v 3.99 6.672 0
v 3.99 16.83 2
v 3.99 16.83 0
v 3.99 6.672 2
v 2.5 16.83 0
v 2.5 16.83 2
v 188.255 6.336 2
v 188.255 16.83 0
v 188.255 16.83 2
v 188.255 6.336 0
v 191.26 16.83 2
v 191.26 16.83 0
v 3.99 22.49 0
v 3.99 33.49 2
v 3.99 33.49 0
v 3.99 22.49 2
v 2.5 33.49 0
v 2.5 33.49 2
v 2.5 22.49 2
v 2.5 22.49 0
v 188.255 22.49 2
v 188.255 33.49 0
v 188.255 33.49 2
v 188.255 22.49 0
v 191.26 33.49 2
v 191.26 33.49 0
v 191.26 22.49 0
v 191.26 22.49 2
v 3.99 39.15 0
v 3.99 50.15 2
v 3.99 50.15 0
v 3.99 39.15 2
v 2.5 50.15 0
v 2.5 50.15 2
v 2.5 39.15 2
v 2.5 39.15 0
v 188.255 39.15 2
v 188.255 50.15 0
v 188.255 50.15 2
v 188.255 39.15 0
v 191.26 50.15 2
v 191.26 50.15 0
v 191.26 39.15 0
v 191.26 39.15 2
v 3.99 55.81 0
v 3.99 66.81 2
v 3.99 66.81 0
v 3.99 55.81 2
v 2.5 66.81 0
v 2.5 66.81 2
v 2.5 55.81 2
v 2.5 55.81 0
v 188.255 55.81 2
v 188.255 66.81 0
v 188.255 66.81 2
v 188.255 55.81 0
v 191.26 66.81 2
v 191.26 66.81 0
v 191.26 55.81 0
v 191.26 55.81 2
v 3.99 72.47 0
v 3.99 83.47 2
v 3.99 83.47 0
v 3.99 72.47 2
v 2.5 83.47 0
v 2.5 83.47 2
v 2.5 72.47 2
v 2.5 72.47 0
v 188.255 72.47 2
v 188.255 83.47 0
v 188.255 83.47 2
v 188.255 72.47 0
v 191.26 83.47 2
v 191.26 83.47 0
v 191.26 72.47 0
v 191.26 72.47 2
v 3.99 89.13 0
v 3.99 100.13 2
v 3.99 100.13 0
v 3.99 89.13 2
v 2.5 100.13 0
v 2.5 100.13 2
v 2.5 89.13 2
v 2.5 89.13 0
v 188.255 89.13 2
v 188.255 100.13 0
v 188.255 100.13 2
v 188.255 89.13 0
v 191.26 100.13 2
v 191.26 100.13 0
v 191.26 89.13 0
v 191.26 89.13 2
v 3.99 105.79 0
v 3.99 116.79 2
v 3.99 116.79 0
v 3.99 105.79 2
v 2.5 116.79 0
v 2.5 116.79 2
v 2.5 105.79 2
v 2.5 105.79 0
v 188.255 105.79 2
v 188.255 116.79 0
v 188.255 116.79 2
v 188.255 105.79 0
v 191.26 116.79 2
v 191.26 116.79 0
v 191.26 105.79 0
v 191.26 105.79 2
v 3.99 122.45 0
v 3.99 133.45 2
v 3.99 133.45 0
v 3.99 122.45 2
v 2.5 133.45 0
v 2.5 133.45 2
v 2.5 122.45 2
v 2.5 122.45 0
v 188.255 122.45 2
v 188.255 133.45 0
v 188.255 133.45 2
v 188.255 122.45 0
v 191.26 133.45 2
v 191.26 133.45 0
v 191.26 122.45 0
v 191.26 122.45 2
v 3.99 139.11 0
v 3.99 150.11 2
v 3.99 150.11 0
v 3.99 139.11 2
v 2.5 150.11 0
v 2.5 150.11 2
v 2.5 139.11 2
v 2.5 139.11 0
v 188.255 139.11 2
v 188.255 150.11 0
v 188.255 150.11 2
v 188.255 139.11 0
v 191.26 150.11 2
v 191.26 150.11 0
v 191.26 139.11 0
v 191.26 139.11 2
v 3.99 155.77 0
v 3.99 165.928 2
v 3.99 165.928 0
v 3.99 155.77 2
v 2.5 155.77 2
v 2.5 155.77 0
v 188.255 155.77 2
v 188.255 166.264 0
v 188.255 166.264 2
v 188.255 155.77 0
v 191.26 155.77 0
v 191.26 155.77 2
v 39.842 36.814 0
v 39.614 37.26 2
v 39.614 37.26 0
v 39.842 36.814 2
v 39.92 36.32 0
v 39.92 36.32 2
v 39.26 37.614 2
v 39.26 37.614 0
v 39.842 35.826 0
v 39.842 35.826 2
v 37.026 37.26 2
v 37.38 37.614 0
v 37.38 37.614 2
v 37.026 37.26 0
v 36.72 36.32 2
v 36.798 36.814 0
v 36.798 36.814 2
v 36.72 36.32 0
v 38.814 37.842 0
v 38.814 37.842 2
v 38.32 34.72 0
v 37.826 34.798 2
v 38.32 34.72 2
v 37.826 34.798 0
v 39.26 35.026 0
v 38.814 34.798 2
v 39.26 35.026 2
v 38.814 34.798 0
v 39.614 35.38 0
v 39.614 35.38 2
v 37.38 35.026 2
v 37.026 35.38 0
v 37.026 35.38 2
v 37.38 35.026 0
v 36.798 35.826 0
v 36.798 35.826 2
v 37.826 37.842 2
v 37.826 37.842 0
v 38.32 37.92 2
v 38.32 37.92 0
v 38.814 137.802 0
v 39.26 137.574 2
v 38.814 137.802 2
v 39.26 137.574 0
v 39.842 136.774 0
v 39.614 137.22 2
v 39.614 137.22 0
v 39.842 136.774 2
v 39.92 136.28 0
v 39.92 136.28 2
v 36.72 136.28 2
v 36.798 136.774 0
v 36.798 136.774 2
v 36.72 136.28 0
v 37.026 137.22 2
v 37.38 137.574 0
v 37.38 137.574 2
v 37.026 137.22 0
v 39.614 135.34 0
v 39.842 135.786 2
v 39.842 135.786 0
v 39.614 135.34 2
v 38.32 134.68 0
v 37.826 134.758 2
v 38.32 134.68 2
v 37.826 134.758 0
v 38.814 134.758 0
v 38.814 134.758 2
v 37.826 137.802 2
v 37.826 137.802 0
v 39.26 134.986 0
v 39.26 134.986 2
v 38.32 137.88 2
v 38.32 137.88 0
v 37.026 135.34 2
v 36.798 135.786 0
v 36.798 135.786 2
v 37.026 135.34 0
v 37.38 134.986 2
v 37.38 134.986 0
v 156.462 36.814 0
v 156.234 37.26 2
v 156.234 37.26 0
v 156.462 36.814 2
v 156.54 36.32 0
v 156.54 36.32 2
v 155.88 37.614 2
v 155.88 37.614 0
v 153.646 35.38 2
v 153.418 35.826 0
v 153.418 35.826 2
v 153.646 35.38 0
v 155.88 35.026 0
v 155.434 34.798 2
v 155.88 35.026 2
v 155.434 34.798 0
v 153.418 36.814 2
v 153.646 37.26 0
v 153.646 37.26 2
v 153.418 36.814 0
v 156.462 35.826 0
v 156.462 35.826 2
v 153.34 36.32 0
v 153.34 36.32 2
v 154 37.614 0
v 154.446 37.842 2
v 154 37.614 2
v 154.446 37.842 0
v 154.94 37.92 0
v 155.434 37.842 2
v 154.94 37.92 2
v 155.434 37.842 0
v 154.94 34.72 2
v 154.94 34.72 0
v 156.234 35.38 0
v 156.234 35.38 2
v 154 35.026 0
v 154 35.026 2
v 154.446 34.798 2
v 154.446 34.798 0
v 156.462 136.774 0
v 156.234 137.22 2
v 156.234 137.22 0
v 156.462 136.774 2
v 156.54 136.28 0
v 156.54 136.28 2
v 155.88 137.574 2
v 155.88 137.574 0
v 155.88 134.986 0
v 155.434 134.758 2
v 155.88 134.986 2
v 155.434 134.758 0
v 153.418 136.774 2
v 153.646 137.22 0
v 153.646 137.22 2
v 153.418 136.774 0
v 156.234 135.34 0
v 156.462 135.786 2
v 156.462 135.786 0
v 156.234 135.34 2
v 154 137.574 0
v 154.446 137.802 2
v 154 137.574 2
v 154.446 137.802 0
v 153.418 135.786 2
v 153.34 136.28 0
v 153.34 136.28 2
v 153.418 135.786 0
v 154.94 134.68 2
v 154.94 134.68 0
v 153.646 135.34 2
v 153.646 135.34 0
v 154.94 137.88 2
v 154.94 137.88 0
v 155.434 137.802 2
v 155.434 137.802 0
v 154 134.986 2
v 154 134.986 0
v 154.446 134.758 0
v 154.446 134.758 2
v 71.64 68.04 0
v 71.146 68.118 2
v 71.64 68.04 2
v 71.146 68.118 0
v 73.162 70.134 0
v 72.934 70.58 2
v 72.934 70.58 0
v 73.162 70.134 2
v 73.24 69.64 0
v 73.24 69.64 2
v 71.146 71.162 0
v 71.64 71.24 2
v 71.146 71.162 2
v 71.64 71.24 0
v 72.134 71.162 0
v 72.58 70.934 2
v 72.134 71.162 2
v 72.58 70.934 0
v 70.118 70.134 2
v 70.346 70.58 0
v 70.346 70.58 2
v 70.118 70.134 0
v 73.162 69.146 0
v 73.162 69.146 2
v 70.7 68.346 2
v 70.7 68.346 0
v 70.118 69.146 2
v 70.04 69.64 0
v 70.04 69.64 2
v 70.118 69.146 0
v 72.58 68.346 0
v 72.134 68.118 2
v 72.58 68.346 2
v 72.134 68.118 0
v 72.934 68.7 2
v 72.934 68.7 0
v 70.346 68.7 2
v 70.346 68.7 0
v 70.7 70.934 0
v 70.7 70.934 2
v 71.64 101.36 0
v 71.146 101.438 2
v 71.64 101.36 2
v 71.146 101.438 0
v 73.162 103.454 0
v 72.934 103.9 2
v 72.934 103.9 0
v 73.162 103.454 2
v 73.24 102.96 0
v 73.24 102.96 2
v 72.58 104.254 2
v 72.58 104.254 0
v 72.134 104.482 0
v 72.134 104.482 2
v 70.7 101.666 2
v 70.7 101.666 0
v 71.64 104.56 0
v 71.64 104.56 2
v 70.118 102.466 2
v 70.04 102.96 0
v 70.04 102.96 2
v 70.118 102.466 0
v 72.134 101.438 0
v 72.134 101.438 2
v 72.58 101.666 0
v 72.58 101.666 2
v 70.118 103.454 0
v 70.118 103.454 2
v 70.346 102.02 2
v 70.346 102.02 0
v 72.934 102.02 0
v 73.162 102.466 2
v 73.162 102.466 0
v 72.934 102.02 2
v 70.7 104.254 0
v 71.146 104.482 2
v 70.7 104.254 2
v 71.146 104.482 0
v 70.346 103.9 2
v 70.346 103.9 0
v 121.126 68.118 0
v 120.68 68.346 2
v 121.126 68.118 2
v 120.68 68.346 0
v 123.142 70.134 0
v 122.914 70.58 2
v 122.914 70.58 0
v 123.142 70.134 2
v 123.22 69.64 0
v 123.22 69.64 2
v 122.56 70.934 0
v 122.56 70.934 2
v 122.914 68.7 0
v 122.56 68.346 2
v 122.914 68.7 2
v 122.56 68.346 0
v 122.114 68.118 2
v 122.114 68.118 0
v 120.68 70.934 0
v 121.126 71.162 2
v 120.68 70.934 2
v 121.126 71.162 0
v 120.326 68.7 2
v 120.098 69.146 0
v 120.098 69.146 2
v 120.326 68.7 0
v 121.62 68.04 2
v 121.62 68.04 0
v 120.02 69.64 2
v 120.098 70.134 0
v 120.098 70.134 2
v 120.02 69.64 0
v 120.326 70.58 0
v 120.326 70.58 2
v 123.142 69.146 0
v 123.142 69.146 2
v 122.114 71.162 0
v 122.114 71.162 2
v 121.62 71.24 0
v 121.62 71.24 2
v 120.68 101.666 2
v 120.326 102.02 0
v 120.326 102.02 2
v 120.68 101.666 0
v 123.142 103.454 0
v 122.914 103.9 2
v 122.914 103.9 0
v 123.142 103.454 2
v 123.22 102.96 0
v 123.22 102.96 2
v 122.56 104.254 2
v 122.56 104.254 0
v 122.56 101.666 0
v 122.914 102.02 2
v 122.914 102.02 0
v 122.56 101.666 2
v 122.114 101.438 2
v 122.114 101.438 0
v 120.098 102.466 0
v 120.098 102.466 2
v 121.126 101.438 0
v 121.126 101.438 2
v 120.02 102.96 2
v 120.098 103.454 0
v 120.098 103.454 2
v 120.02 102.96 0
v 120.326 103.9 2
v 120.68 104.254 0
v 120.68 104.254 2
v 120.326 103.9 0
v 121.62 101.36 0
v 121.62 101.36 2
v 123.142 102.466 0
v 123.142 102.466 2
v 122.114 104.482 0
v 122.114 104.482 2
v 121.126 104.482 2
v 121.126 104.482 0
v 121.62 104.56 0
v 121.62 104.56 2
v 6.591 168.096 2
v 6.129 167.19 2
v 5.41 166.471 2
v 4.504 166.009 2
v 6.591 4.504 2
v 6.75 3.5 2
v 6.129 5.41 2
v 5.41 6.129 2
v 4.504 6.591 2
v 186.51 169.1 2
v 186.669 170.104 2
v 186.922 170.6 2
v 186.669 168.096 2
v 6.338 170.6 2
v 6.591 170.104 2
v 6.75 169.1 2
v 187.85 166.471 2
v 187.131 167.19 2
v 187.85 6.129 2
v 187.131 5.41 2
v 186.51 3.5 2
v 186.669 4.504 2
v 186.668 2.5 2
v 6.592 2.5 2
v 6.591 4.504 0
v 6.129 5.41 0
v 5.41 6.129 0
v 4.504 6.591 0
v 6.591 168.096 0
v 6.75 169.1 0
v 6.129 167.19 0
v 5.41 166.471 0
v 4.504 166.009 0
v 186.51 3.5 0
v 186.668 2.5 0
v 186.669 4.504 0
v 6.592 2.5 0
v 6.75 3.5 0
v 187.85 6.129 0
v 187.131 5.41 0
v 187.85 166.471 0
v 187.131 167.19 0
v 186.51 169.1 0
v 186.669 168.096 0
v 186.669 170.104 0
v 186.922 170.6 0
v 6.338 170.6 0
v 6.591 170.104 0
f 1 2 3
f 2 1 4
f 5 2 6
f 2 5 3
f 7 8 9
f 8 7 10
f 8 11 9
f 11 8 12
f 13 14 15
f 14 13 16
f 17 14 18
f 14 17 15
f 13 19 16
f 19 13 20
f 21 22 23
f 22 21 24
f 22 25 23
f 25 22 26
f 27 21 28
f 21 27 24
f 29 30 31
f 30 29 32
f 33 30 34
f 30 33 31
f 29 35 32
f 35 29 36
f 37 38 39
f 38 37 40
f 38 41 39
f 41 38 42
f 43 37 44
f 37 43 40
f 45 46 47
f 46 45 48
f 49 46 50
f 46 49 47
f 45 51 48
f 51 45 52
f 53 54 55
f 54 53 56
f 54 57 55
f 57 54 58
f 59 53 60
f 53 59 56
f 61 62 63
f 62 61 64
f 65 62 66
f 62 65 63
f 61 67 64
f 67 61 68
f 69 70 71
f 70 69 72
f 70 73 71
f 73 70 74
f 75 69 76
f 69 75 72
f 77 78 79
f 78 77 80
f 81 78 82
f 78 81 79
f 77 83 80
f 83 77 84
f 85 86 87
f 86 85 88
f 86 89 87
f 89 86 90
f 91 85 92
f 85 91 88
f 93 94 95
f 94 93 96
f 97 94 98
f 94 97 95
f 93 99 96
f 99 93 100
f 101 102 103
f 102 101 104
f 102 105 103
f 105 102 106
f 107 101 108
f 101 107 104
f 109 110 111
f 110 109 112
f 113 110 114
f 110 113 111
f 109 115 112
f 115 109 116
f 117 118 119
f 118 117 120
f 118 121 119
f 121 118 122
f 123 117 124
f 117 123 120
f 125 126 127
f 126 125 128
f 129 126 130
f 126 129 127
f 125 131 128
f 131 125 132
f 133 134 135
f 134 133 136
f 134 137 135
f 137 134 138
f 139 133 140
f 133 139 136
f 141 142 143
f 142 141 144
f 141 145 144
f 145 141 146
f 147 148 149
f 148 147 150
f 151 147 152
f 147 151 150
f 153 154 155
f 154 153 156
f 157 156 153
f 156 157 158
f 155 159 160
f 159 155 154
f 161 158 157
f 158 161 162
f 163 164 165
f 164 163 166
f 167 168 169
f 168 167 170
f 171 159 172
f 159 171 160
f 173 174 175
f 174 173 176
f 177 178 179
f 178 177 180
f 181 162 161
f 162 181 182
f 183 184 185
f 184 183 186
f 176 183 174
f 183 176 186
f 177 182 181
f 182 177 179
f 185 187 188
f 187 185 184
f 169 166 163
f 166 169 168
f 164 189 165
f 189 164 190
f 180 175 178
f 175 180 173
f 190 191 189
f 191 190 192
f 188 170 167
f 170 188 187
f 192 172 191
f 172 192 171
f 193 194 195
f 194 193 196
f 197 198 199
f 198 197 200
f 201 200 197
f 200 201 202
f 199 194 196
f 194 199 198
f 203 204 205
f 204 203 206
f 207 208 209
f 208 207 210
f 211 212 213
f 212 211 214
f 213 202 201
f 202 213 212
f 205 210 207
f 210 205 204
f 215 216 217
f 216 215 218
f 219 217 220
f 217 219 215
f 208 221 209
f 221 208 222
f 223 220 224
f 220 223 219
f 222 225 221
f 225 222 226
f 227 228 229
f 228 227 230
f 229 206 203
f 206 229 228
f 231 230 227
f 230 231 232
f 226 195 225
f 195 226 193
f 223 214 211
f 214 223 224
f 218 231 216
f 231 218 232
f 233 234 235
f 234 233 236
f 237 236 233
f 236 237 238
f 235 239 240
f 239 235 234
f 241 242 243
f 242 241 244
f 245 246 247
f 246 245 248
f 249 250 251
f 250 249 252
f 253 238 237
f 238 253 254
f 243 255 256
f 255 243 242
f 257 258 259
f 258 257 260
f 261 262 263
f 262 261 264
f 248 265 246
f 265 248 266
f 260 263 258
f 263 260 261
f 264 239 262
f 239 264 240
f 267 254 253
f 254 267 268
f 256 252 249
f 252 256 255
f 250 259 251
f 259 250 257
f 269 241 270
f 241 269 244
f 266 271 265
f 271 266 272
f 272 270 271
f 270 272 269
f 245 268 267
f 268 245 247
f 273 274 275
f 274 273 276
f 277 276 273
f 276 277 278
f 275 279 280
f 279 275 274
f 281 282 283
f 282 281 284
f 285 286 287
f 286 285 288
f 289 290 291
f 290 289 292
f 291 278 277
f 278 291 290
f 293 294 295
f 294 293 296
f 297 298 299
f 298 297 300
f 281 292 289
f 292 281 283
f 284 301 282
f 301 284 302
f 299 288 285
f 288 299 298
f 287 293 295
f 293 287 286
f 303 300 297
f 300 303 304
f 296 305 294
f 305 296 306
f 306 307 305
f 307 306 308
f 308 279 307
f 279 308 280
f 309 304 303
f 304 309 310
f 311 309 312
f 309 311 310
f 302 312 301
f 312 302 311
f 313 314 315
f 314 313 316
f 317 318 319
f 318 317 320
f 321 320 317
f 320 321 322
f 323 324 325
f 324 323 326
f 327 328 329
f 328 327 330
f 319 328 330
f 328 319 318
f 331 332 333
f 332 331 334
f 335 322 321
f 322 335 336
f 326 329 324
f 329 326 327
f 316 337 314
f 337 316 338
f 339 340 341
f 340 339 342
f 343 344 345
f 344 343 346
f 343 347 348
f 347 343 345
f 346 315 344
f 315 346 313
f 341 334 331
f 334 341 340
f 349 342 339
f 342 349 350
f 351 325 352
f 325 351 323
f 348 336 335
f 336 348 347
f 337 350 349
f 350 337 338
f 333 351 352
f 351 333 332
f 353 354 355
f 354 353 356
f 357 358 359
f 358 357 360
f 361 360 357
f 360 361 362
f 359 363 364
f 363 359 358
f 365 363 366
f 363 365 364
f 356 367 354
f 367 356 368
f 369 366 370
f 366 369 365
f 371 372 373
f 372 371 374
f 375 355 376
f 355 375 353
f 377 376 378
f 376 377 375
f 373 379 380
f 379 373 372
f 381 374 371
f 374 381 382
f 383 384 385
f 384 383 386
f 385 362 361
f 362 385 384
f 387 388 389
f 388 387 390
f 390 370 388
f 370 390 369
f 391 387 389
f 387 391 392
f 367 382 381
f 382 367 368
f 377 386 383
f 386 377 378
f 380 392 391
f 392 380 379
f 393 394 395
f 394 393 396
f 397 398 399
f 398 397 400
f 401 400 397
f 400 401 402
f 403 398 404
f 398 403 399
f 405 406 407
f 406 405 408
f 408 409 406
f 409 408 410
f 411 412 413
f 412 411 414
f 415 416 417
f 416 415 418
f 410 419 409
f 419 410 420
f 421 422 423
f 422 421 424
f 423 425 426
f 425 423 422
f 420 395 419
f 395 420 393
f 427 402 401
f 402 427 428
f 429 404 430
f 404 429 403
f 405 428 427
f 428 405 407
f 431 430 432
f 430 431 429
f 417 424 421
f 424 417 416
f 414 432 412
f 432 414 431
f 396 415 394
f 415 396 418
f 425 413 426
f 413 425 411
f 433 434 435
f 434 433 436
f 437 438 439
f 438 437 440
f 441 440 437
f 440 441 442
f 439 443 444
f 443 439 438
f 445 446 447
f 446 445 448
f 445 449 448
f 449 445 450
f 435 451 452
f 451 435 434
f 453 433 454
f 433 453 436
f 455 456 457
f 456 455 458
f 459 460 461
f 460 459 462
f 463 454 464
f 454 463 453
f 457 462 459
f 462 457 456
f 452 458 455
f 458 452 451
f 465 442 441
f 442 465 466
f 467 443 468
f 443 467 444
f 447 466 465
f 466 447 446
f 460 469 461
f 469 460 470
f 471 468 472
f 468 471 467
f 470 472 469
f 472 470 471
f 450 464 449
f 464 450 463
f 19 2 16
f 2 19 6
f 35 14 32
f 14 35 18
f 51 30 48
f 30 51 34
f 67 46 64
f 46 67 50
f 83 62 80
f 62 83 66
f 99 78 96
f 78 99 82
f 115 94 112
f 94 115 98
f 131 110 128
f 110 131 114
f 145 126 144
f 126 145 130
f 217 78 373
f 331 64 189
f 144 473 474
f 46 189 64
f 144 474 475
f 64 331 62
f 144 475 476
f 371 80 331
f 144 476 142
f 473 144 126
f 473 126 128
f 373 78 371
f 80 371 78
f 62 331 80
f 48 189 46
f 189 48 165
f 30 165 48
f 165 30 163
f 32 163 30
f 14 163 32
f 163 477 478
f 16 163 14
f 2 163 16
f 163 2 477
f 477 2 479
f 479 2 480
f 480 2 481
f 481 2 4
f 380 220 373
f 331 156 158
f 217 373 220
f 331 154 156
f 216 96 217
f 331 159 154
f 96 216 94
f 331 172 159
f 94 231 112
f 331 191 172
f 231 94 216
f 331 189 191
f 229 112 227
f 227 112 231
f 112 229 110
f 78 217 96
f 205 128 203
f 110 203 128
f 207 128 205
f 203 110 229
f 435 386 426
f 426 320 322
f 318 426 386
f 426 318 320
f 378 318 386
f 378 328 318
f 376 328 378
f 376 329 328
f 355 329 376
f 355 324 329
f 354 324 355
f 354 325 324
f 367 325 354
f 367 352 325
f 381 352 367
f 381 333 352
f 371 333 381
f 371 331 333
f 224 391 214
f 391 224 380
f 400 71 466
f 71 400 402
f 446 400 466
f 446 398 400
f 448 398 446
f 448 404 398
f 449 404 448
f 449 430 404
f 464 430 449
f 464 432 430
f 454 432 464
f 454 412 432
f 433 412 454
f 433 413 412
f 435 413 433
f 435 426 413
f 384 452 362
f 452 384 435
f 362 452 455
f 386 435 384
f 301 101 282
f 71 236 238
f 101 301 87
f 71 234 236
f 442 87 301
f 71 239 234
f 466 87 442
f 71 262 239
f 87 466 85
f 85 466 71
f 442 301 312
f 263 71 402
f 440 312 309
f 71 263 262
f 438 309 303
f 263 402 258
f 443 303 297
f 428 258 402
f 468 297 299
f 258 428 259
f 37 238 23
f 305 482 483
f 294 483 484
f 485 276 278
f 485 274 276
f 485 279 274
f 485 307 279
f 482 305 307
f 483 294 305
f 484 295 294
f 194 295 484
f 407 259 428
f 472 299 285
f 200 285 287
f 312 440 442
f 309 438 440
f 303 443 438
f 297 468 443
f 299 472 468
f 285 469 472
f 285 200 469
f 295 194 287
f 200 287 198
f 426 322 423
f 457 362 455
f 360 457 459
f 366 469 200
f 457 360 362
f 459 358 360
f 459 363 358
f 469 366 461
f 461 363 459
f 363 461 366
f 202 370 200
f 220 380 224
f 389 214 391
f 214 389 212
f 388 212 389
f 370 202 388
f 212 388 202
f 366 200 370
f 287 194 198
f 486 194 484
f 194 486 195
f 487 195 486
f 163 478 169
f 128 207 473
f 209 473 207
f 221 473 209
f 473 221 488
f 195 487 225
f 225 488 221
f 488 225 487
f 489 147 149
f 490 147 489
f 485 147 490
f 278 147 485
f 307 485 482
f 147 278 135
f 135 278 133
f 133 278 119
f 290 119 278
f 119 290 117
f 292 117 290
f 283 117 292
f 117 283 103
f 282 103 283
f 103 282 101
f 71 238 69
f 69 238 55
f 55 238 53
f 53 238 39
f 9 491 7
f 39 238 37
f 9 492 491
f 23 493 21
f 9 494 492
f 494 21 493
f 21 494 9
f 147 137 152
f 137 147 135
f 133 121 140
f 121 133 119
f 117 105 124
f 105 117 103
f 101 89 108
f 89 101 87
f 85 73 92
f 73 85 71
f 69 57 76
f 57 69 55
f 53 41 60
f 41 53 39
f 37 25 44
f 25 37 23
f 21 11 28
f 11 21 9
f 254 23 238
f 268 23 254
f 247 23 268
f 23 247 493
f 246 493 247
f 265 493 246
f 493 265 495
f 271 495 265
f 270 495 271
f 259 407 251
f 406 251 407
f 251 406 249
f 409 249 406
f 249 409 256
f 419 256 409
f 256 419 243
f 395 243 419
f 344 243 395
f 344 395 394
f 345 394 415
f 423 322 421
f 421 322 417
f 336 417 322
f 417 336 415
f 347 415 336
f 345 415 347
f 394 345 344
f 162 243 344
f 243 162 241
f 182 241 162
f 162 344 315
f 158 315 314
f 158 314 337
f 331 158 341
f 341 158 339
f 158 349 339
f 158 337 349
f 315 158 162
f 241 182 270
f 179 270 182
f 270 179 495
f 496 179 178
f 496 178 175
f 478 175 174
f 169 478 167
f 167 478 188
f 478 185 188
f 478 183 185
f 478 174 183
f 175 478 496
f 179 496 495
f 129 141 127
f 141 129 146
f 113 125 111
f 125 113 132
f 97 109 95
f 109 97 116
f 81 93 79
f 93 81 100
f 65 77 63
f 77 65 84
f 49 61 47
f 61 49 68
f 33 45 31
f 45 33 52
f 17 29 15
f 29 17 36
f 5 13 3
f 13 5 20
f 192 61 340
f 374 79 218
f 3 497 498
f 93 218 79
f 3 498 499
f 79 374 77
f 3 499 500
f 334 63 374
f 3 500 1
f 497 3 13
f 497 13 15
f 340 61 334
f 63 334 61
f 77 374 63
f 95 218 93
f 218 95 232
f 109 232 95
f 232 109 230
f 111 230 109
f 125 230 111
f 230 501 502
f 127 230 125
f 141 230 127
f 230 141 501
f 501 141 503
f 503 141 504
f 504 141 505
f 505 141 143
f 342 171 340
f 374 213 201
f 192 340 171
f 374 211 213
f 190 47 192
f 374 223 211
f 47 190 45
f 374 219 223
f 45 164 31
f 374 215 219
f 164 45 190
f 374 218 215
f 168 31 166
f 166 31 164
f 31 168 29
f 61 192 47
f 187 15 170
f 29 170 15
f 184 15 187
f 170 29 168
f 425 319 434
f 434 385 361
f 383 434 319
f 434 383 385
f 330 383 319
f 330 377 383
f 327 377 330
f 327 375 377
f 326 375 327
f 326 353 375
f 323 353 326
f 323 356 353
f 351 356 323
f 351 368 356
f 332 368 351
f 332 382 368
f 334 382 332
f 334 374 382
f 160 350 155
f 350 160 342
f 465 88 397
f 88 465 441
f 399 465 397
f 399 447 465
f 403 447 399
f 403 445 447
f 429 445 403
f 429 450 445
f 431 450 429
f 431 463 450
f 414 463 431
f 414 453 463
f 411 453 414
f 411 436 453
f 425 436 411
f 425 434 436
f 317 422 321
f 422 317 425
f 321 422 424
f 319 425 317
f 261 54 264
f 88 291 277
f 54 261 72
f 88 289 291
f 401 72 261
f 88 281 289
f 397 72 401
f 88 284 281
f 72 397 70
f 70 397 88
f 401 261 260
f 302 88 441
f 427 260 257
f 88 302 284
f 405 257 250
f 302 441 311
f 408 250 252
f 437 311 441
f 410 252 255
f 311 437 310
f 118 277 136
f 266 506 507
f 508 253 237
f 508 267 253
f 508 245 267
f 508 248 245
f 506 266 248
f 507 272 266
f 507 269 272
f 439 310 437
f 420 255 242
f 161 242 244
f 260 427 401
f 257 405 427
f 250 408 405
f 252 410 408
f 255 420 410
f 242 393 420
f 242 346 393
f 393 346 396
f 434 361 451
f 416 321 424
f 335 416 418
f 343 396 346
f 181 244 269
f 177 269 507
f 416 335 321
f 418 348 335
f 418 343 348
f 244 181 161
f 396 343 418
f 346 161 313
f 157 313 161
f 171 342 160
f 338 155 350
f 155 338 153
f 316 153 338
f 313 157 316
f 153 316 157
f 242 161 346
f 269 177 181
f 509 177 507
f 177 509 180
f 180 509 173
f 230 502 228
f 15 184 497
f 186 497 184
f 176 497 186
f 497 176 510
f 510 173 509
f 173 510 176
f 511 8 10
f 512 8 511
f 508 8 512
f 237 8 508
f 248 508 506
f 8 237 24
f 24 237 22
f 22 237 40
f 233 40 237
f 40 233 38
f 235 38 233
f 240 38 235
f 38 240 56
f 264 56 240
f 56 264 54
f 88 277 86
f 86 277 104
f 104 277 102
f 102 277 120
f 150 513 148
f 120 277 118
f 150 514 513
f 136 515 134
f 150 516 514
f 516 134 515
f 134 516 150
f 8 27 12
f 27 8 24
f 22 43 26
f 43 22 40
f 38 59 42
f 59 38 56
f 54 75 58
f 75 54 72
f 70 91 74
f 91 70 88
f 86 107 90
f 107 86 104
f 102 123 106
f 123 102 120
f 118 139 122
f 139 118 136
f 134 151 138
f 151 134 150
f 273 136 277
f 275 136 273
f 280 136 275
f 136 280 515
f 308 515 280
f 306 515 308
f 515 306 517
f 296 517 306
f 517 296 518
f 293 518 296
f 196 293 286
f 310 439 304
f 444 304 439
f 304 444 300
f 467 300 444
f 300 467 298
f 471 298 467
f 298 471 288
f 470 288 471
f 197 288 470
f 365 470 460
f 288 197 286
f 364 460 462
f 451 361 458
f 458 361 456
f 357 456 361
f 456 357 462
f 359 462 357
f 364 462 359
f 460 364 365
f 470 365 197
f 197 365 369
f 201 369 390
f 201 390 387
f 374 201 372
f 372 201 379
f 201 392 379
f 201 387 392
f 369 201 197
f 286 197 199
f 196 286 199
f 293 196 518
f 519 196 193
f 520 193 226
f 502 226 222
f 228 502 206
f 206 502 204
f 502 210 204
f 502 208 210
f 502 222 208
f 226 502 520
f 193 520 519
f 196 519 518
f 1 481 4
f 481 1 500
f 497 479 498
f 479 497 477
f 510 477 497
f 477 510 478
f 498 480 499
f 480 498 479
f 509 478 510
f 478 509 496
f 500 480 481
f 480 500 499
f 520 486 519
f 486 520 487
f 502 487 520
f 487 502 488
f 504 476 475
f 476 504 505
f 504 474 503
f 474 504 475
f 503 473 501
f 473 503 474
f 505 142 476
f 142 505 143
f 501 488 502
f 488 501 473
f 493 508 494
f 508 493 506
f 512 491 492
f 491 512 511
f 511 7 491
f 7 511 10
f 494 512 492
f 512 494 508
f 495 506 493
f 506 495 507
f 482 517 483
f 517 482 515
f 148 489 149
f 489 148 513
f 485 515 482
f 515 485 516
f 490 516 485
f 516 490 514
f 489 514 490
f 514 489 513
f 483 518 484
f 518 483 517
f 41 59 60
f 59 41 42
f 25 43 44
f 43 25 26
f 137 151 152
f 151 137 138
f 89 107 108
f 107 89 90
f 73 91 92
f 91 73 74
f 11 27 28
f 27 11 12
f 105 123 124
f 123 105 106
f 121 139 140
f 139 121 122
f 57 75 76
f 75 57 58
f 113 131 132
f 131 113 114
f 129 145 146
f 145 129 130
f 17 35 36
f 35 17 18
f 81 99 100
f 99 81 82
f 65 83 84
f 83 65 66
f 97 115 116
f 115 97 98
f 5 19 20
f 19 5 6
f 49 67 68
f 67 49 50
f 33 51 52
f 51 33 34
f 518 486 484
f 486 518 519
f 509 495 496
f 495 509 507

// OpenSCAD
// file: letter_plate.scad
// This work is licensed under a Creative Commons Attribution-NonCommercial-ShareAlike 4.0 International License.
// https://creativecommons.org/licenses/by-nc-sa/4.0/
// (c) 2018 Florian Roks <florian.roks (a) gmail.com>

include <config.scad>

module letter(v, special) {
    if (special) {
        text(text = v, size = FONT_SPECIAL_SIZE, valign="center", halign="center", font=FONT_SPECIAL);
    } else {
        text(text = v, size = FONT_NORMAL_SIZE, valign="center", halign="center", font=FONT_NORMAL);
    }
}

module letter_cutouts() {
    translate([HORIZ_SIDE_EXTRA + LED_STRIPE_HORIZ_DISTANCE/2,
               VERT_SIDE_EXTRA + LED_STRIPE_VERT_DISTANCE/2,
               LETTER_PLATE_LETTER_BOTTOM]) {
        for(y = [0 : 1 : LETTER_MATRIX_HEIGHT - 1]) {
            for(x = [LETTER_MATRIX_WIDTH - 1 : -1 : 0]) {
                translate([
                    (LETTER_MATRIX_WIDTH*LED_STRIPE_HORIZ_DISTANCE) - (x+1)*LED_STRIPE_HORIZ_DISTANCE, 
                    (LETTER_MATRIX_HEIGHT * LED_STRIPE_VERT_DISTANCE) - (y+1)*LED_STRIPE_VERT_DISTANCE, 
                    0]) {
                    linear_extrude(height=LETTER_PLATE_THICKNESS)
                            rotate([0,180,0])
                                letter(v = LETTERFACE[y][x],
                                       special = (LETTER_MATRIX_HEIGHT-1 == y),
                                       x=x, y=y);
                }
            }
        }
    }
}

module front_plate() {
    cube([TOTAL_WIDTH, TOTAL_HEIGHT, LETTER_PLATE_THICKNESS]);
}

module outer_frame() {
    cube([TOTAL_WIDTH, OUTER_WALL_THICKNESS, OUTER_WALL_HEIGHT]);
    cube([OUTER_WALL_THICKNESS, TOTAL_HEIGHT, OUTER_WALL_HEIGHT]);
    translate([0, TOTAL_HEIGHT-OUTER_WALL_THICKNESS, 0]) 
        cube([TOTAL_WIDTH, OUTER_WALL_THICKNESS, OUTER_WALL_HEIGHT]);
    translate([TOTAL_WIDTH-OUTER_WALL_THICKNESS, 0, 0]) 
        cube([OUTER_WALL_THICKNESS, TOTAL_HEIGHT, OUTER_WALL_HEIGHT]);
}

module inner_separator_grid() {
    for(x = [0 : 1 : LETTER_MATRIX_WIDTH]) {
        translate([x*LED_STRIPE_HORIZ_DISTANCE+HORIZ_SIDE_EXTRA-LETTER_SEPARATOR_THICKNESS/2, 
                   0, 
                   0])
            cube([LETTER_SEPARATOR_THICKNESS, 
                  TOTAL_HEIGHT, 
                  LETTER_SEPARATOR_HEIGHT]);
    }
    for(y = [0 : 1 : LETTER_MATRIX_HEIGHT]) {
        translate([0, 
                   (y*LED_STRIPE_VERT_DISTANCE)+VERT_SIDE_EXTRA-LETTER_SEPARATOR_THICKNESS/2, 
                   0])
            cube([TOTAL_WIDTH, 
                  LETTER_SEPARATOR_THICKNESS, 
                  LETTER_SEPARATOR_HEIGHT]);
    }   
}

module screw_hole_walls() {
    for (p = LETTER_PLATE_MOUNTING_HOLE_POSITIONS) {
        translate([HORIZ_SIDE_EXTRA + LED_STRIPE_HORIZ_DISTANCE * p[0], 
                   VERT_SIDE_EXTRA + LED_STRIPE_VERT_DISTANCE * p[1], 
                   LETTER_SEPARATOR_HEIGHT - LETTER_SEPARATOR_HEIGHT]) 
            cylinder(h=LETTER_SEPARATOR_HEIGHT, d=LETTER_PLATE_SCREW_WALL_DIAMETER);
    }
}

module screw_holes() {
    for (p = LETTER_PLATE_MOUNTING_HOLE_POSITIONS) {
        translate([HORIZ_SIDE_EXTRA + LED_STRIPE_HORIZ_DISTANCE * p[0],
                   VERT_SIDE_EXTRA + LED_STRIPE_VERT_DISTANCE * p[1],
                   LETTER_SEPARATOR_HEIGHT - LETTER_PLATE_SCREW_INSERT_HEIGHT]) 
            cylinder(h=LETTER_PLATE_SCREW_INSERT_HEIGHT+0.01, 
                     d=LETTER_PLATE_SCREW_INSERT_DIAMETER);
    }
    
}

module corner_hole_wall(offset=0,h=OUTER_WALL_HEIGHT) {
    translate([CORNER_MOUNTING_HOLE_WALL_DIAMETER/2,
               CORNER_MOUNTING_HOLE_WALL_DIAMETER/2,
               h/2])
        cylinder(h=h, 
                 d=CORNER_MOUNTING_HOLE_WALL_DIAMETER+offset, 
                 center=true);
}

module corner_holes_walls(offset=0,h=OUTER_WALL_HEIGHT) {
    translate([CORNER_MOUNTING_HOLE_OFFSET,
               CORNER_MOUNTING_HOLE_OFFSET,
               0]) 
        corner_hole_wall(offset=offset,h=h);
    translate([CORNER_MOUNTING_HOLE_OFFSET,
               TOTAL_HEIGHT - CORNER_MOUNTING_HOLE_WALL_DIAMETER - CORNER_MOUNTING_HOLE_OFFSET,
               0]) 
        corner_hole_wall(offset=offset,h=h);
    translate([TOTAL_WIDTH - CORNER_MOUNTING_HOLE_WALL_DIAMETER-CORNER_MOUNTING_HOLE_OFFSET,
               CORNER_MOUNTING_HOLE_OFFSET,
               0]) 
        corner_hole_wall(offset=offset,h=h);
    translate([TOTAL_WIDTH - CORNER_MOUNTING_HOLE_WALL_DIAMETER - CORNER_MOUNTING_HOLE_OFFSET,
               TOTAL_HEIGHT - CORNER_MOUNTING_HOLE_WALL_DIAMETER - CORNER_MOUNTING_HOLE_OFFSET,
               0]) 
        corner_hole_wall(offset=offset,h=h);
}

module corner_holes_walls_bump() {
    intersection() {
        corner_holes_walls(offset=OUTER_WALL_THICKNESS, h=LETTER_SEPARATOR_HEIGHT);
        cube([TOTAL_WIDTH, TOTAL_HEIGHT, TOTAL_DEPTH]);
    }
}


module corner_hole() {
    translate([CORNER_MOUNTING_HOLE_WALL_DIAMETER/2,
               CORNER_MOUNTING_HOLE_WALL_DIAMETER/2,
               CORNER_MOUNTING_HOLE_INSERT_HEIGHT/2 + OUTER_WALL_HEIGHT - CORNER_MOUNTING_HOLE_INSERT_HEIGHT])
        cylinder(h=CORNER_MOUNTING_HOLE_INSERT_HEIGHT+0.01, 
                 d=CORNER_MOUNTING_HOLE_INSERT_DIAMETER, 
                 center=true);
}

module corner_holes() {
    translate([CORNER_MOUNTING_HOLE_OFFSET,
               CORNER_MOUNTING_HOLE_OFFSET,
               0]) 
        corner_hole();
    translate([CORNER_MOUNTING_HOLE_OFFSET,
               TOTAL_HEIGHT-CORNER_MOUNTING_HOLE_WALL_DIAMETER-CORNER_MOUNTING_HOLE_OFFSET,
               0]) 
        corner_hole();
    translate([TOTAL_WIDTH-CORNER_MOUNTING_HOLE_WALL_DIAMETER-CORNER_MOUNTING_HOLE_OFFSET,
               CORNER_MOUNTING_HOLE_OFFSET,
               0]) 
        corner_hole();
    translate([TOTAL_WIDTH-CORNER_MOUNTING_HOLE_WALL_DIAMETER - CORNER_MOUNTING_HOLE_OFFSET,
               TOTAL_HEIGHT-CORNER_MOUNTING_HOLE_WALL_DIAMETER - CORNER_MOUNTING_HOLE_OFFSET,
               0]) 
        corner_hole();
}

module clock_front() {
    difference() {
        union() {
            outer_frame();
            front_plate();
            inner_separator_grid();
            screw_hole_walls();
            corner_holes_walls_bump();
            corner_holes_walls();
        }
        letter_cutouts();
        screw_holes();
        corner_holes();
    }
    
}

// arranged for 3d-printing / stl-export
clock_front();
// file: led_holder_plate.scad
// This work is licensed under a Creative Commons Attribution-NonCommercial-ShareAlike 4.0 International License.
// https://creativecommons.org/licenses/by-nc-sa/4.0/
// (c) 2018 Florian Roks <florian.roks (a) gmail.com>

include <config.scad>
use <letter_plate.scad>

module led_holes() {
	for (y = [0 : 1 : LETTER_MATRIX_HEIGHT - 1]) {
		for (x = [0 : 1 : LETTER_MATRIX_WIDTH - 1]) {
            translate([HORIZ_SIDE_EXTRA + LED_STRIPE_HORIZ_DISTANCE*x,
                       VERT_SIDE_EXTRA + LED_STRIPE_VERT_DISTANCE*y, 
                       0]) 
			translate([LED_STRIPE_HORIZ_DISTANCE/2, 
                       LED_STRIPE_VERT_DISTANCE/2, 
                       -10]) 
                cube([LED_STRIPE_LED_WIDTH, 
                      LED_STRIPE_LED_HEIGHT, 
                      100], 
                     center = true);
		}
	}
}

module cap_holes() {
	for (y = [0 : 1 : LETTER_MATRIX_HEIGHT - 1]) {
		for (x = [0 : 1 : LETTER_MATRIX_WIDTH - 1]) {
            translate([HORIZ_SIDE_EXTRA + LED_STRIPE_HORIZ_DISTANCE*x+LED_STRIPE_CAP_OFFSET_X,
                       VERT_SIDE_EXTRA + LED_STRIPE_VERT_DISTANCE*y+LED_STRIPE_CAP_OFFSET_Y, 
                       0]) 
			translate([LED_STRIPE_HORIZ_DISTANCE/2, 
                       LED_STRIPE_VERT_DISTANCE/2, 
                       LED_HOLDER_PLATE_HEIGHT]) 
                cube([LED_STRIPE_CAP_WIDTH, 
                      LED_STRIPE_CAP_HEIGHT, 
                      LED_STRIPE_CAP_DEPTH+0.01], 
                     center = true);
		}
	}
}

module screw_holes() {
   for (p = LETTER_PLATE_MOUNTING_HOLE_POSITIONS) {
       translate([HORIZ_SIDE_EXTRA + LED_STRIPE_HORIZ_DISTANCE*p[0], 
                  VERT_SIDE_EXTRA + LED_STRIPE_VERT_DISTANCE*p[1],
                  0]) 
        cylinder(d=SCREW_DIAMETER, h=100, center=true);
   }
}

module separator_cutout() {
    for (y = [0 : 1 : LETTER_MATRIX_HEIGHT]) {
        translate([TOTAL_WIDTH/2, 
                   VERT_SIDE_EXTRA + LED_STRIPE_VERT_DISTANCE*y, 
                   LED_HOLDER_PLATE_DIVIDER_CUTOUT_DEPTH/2]) 
            cube([TOTAL_WIDTH, 
                  LETTER_SEPARATOR_THICKNESS + LED_HOLDER_PLATE_DIVIDER_CUTOUT_TOLERANCE,
                  LED_HOLDER_PLATE_DIVIDER_CUTOUT_DEPTH+0.01], 
                 center = true);
    }
    for (x = [0 : 1 : LETTER_MATRIX_WIDTH]) {
        translate([HORIZ_SIDE_EXTRA + LED_STRIPE_HORIZ_DISTANCE*x, 
                   VERT_SIDE_EXTRA + TOTAL_HEIGHT/2, 
                   LED_HOLDER_PLATE_DIVIDER_CUTOUT_DEPTH/2]) 
            cube([LETTER_SEPARATOR_THICKNESS + LED_HOLDER_PLATE_DIVIDER_CUTOUT_TOLERANCE, 
                  TOTAL_WIDTH, 
                  LED_HOLDER_PLATE_DIVIDER_CUTOUT_DEPTH+0.01], 
                 center = true);
    }
    for (p = LETTER_PLATE_MOUNTING_HOLE_POSITIONS) {
       translate([HORIZ_SIDE_EXTRA + LED_STRIPE_HORIZ_DISTANCE*p[0], 
                  VERT_SIDE_EXTRA + LED_STRIPE_VERT_DISTANCE*p[1], 
                  LED_HOLDER_PLATE_DIVIDER_CUTOUT_DEPTH/2])
        cylinder(d=LETTER_PLATE_SCREW_INSERT_DIAMETER+LETTER_PLATE_SCREW_INSERT_WALL_THICKNESS+LED_HOLDER_PLATE_DIVIDER_CUTOUT_TOLERANCE, 
                 h=LED_HOLDER_PLATE_DIVIDER_CUTOUT_DEPTH+0.01, center=true);
    }
}

module fit_inner_cube() {
    size_x = TOTAL_WIDTH-2*OUTER_WALL_THICKNESS-INNER_PLATE_TOLERANCE/2;
    size_y = TOTAL_HEIGHT-2*OUTER_WALL_THICKNESS-INNER_PLATE_TOLERANCE/2;
    difference() {
        translate([OUTER_WALL_THICKNESS+INNER_PLATE_TOLERANCE/2,
                   OUTER_WALL_THICKNESS+INNER_PLATE_TOLERANCE/2, 
                   -10])
            cube([size_x, size_y, 100]);
        corner_holes_walls(offset = INNER_PLATE_TOLERANCE/2, h=100);
    }
}

module led_holder_plate() {
    intersection() {
        difference() {
            cube([TOTAL_WIDTH,
                  TOTAL_HEIGHT, 
                  LED_HOLDER_PLATE_HEIGHT]);
            led_holes();
            cap_holes();
            screw_holes();
            separator_cutout();
        };
        translate([0,0,-01]) fit_inner_cube();
    }
}

// arranged for 3d-printing / stl-export
translate([0, 0, LED_HOLDER_PLATE_HEIGHT]) 
    rotate([0,180,0]) 
        led_holder_plate();
// file: config.scad
// This work is licensed under a Creative Commons Attribution-NonCommercial-ShareAlike 4.0 International License.
// https://creativecommons.org/licenses/by-nc-sa/4.0/
// (c) 2018 Florian Roks <florian.roks (a) gmail.com>

FONT_NORMAL = "DejaVu Sans Mono";
FONT_NORMAL_SIZE = 10;
FONT_SPECIAL = "DejaVu Sans";
FONT_SPECIAL_SIZE = FONT_NORMAL_SIZE;

LED_STRIPE_HORIZ_DISTANCE = 16.66;
LED_STRIPE_VERT_DISTANCE = 16.66;

LED_STRIPE_LED_WIDTH = 8; // The stripes are soldered together, at those points the distance between leds is a lot higher
LED_STRIPE_LED_HEIGHT = 8;

LED_STRIPE_CAP_WIDTH = 3;
LED_STRIPE_CAP_HEIGHT = 5;
LED_STRIPE_CAP_DEPTH = 1.2;

LED_STRIPE_CAP_OFFSET_X = -4;
LED_STRIPE_CAP_OFFSET_Y = 0;

LETTER_PLATE_LETTER_BOTTOM = 0.15;
LETTER_PLATE_THICKNESS = 1;
//LETTER_PLATE_BLINDS_HEIGHT = 3;
LETTER_SEPARATOR_THICKNESS = 2;
LETTER_SEPARATOR_HEIGHT = 10;

LETTER_PLATE_SCREW_INSERT_HEIGHT = 3.5;
LETTER_PLATE_SCREW_INSERT_WALL_THICKNESS = 2;
LETTER_PLATE_SCREW_INSERT_DIAMETER = 4;
LETTER_PLATE_SCREW_WALL_DIAMETER = LETTER_PLATE_SCREW_INSERT_DIAMETER + LETTER_PLATE_SCREW_INSERT_WALL_THICKNESS;
SCREW_DIAMETER = 3.2; // M3 plus tolerance

LED_HOLDER_PLATE_HEIGHT = 1.5;
INNER_PLATE_TOLERANCE = 1;

LED_HOLDER_PLATE_DIVIDER_CUTOUT_DEPTH = 0.6;
LED_HOLDER_PLATE_DIVIDER_CUTOUT_TOLERANCE = 1;

LED_FIXATION_CUTOUT_HEIGHT = 11;
LED_FIXATION_CUTOUT_WIDTH = 3;
LED_FIXATION_PLATE_THICKNESS = 2;

OUTER_WALL_THICKNESS = 2;
OUTER_WALL_HEIGHT = 2 + LETTER_SEPARATOR_HEIGHT + (LED_HOLDER_PLATE_HEIGHT-LED_HOLDER_PLATE_DIVIDER_CUTOUT_DEPTH) + LED_FIXATION_PLATE_THICKNESS;
// 2mm height tolerance to adjust fitting and led-stripe height

$fn=20;

LETTERFACE = ["EINSZWANZIG", 
              "DREIVIERTEL",
              "FÜNFZEHNELF",
              "VORHALBNACH",
              "ACHTNEUNELF",
              "ZWEIKDREINS",
              "XSECHSIEBEN",
              "QYZWÖLFÜNFJ",
              "GVIERPZEHNO",
              "\u26a0\u267B\u2709\u0298\u2160\u2161\u263C\u2601\u2602\u2744\u26A1"];

LETTER_MATRIX_HEIGHT = len(LETTERFACE);
LETTER_MATRIX_WIDTH = len(LETTERFACE[0]);

HORIZ_SIDE_EXTRA = 5;
VERT_SIDE_EXTRA = 3;

TOTAL_WIDTH = LED_STRIPE_HORIZ_DISTANCE * LETTER_MATRIX_WIDTH + 2 * HORIZ_SIDE_EXTRA;
TOTAL_HEIGHT = LED_STRIPE_VERT_DISTANCE * LETTER_MATRIX_HEIGHT + 2 * VERT_SIDE_EXTRA;
TOTAL_DEPTH = LETTER_SEPARATOR_HEIGHT + LED_HOLDER_PLATE_HEIGHT;
                  
OUTER_HOLES_DIST = 2;                  
INNER_HOLES_DIST = 4;
                  
CORNER_MOUNTING_HOLE_INSERT_HEIGHT = LETTER_PLATE_SCREW_INSERT_HEIGHT;
CORNER_MOUNTING_HOLE_INSERT_DIAMETER = LETTER_PLATE_SCREW_INSERT_DIAMETER;
CORNER_MOUNTING_HOLE_INSERT_WALL_THICKNESS = LETTER_PLATE_SCREW_INSERT_WALL_THICKNESS;
CORNER_MOUNTING_HOLE_WALL_DIAMETER = CORNER_MOUNTING_HOLE_INSERT_DIAMETER + CORNER_MOUNTING_HOLE_INSERT_WALL_THICKNESS;
CORNER_MOUNTING_HOLE_OFFSET = 0.5;
				  
LETTER_PLATE_MOUNTING_HOLE_POSITIONS = [
                    [OUTER_HOLES_DIST, OUTER_HOLES_DIST], 
                    [OUTER_HOLES_DIST, LETTER_MATRIX_HEIGHT - OUTER_HOLES_DIST],
                    [LETTER_MATRIX_WIDTH - OUTER_HOLES_DIST, OUTER_HOLES_DIST],
                    [LETTER_MATRIX_WIDTH - OUTER_HOLES_DIST, LETTER_MATRIX_HEIGHT - OUTER_HOLES_DIST],
                    [INNER_HOLES_DIST, INNER_HOLES_DIST],
                    [INNER_HOLES_DIST, LETTER_MATRIX_HEIGHT - INNER_HOLES_DIST],
                    [LETTER_MATRIX_WIDTH - INNER_HOLES_DIST, INNER_HOLES_DIST],
                    [LETTER_MATRIX_WIDTH - INNER_HOLES_DIST, LETTER_MATRIX_HEIGHT - INNER_HOLES_DIST],
                    ];
                  
// main file
// This work is licensed under a Creative Commons Attribution-NonCommercial-ShareAlike 4.0 International License.
// https://creativecommons.org/licenses/by-nc-sa/4.0/
// (c) 2018 Florian Roks <florian.roks (a) gmail.com>


include <config.scad>
use <led_holder_plate.scad>

module led_fixation_plate_cutouts() {
    for (y = [0 : 1 : LETTER_MATRIX_HEIGHT - 1]) {
        translate([OUTER_WALL_THICKNESS+INNER_PLATE_TOLERANCE/2-0.01, 
                   VERT_SIDE_EXTRA + y*LED_STRIPE_VERT_DISTANCE, 
                   -0.01]) {
        translate([0, 
                   LED_STRIPE_VERT_DISTANCE/2, 
                   0]) {
                cube([LED_FIXATION_CUTOUT_WIDTH, 
                      LED_FIXATION_CUTOUT_HEIGHT, 
                      LED_FIXATION_PLATE_THICKNESS*3],
                     center=true);
            }
        }
        translate([TOTAL_WIDTH - LED_FIXATION_CUTOUT_WIDTH - INNER_PLATE_TOLERANCE/2, 
                   VERT_SIDE_EXTRA + y*LED_STRIPE_VERT_DISTANCE, 
                   -0.01]) {
        translate([0, 
                   LED_STRIPE_VERT_DISTANCE/2, 
                   0]) {
                cube([LED_FIXATION_CUTOUT_WIDTH+0.01, 
                      LED_FIXATION_CUTOUT_HEIGHT, 
                      LED_FIXATION_PLATE_THICKNESS*3],
                     center=true);
            }
        }
    }
}

module led_fixation_plate_simple() {
    cube([TOTAL_WIDTH,
          TOTAL_HEIGHT,
          LED_FIXATION_PLATE_THICKNESS]);
}

module led_fixation_plate() {   
    intersection() {
        difference() {
            led_fixation_plate_simple();
            led_fixation_plate_cutouts();
            screw_holes();
        }
        translate([0,0,-10]) fit_inner_cube();
    }
}

led_fixation_plate();
